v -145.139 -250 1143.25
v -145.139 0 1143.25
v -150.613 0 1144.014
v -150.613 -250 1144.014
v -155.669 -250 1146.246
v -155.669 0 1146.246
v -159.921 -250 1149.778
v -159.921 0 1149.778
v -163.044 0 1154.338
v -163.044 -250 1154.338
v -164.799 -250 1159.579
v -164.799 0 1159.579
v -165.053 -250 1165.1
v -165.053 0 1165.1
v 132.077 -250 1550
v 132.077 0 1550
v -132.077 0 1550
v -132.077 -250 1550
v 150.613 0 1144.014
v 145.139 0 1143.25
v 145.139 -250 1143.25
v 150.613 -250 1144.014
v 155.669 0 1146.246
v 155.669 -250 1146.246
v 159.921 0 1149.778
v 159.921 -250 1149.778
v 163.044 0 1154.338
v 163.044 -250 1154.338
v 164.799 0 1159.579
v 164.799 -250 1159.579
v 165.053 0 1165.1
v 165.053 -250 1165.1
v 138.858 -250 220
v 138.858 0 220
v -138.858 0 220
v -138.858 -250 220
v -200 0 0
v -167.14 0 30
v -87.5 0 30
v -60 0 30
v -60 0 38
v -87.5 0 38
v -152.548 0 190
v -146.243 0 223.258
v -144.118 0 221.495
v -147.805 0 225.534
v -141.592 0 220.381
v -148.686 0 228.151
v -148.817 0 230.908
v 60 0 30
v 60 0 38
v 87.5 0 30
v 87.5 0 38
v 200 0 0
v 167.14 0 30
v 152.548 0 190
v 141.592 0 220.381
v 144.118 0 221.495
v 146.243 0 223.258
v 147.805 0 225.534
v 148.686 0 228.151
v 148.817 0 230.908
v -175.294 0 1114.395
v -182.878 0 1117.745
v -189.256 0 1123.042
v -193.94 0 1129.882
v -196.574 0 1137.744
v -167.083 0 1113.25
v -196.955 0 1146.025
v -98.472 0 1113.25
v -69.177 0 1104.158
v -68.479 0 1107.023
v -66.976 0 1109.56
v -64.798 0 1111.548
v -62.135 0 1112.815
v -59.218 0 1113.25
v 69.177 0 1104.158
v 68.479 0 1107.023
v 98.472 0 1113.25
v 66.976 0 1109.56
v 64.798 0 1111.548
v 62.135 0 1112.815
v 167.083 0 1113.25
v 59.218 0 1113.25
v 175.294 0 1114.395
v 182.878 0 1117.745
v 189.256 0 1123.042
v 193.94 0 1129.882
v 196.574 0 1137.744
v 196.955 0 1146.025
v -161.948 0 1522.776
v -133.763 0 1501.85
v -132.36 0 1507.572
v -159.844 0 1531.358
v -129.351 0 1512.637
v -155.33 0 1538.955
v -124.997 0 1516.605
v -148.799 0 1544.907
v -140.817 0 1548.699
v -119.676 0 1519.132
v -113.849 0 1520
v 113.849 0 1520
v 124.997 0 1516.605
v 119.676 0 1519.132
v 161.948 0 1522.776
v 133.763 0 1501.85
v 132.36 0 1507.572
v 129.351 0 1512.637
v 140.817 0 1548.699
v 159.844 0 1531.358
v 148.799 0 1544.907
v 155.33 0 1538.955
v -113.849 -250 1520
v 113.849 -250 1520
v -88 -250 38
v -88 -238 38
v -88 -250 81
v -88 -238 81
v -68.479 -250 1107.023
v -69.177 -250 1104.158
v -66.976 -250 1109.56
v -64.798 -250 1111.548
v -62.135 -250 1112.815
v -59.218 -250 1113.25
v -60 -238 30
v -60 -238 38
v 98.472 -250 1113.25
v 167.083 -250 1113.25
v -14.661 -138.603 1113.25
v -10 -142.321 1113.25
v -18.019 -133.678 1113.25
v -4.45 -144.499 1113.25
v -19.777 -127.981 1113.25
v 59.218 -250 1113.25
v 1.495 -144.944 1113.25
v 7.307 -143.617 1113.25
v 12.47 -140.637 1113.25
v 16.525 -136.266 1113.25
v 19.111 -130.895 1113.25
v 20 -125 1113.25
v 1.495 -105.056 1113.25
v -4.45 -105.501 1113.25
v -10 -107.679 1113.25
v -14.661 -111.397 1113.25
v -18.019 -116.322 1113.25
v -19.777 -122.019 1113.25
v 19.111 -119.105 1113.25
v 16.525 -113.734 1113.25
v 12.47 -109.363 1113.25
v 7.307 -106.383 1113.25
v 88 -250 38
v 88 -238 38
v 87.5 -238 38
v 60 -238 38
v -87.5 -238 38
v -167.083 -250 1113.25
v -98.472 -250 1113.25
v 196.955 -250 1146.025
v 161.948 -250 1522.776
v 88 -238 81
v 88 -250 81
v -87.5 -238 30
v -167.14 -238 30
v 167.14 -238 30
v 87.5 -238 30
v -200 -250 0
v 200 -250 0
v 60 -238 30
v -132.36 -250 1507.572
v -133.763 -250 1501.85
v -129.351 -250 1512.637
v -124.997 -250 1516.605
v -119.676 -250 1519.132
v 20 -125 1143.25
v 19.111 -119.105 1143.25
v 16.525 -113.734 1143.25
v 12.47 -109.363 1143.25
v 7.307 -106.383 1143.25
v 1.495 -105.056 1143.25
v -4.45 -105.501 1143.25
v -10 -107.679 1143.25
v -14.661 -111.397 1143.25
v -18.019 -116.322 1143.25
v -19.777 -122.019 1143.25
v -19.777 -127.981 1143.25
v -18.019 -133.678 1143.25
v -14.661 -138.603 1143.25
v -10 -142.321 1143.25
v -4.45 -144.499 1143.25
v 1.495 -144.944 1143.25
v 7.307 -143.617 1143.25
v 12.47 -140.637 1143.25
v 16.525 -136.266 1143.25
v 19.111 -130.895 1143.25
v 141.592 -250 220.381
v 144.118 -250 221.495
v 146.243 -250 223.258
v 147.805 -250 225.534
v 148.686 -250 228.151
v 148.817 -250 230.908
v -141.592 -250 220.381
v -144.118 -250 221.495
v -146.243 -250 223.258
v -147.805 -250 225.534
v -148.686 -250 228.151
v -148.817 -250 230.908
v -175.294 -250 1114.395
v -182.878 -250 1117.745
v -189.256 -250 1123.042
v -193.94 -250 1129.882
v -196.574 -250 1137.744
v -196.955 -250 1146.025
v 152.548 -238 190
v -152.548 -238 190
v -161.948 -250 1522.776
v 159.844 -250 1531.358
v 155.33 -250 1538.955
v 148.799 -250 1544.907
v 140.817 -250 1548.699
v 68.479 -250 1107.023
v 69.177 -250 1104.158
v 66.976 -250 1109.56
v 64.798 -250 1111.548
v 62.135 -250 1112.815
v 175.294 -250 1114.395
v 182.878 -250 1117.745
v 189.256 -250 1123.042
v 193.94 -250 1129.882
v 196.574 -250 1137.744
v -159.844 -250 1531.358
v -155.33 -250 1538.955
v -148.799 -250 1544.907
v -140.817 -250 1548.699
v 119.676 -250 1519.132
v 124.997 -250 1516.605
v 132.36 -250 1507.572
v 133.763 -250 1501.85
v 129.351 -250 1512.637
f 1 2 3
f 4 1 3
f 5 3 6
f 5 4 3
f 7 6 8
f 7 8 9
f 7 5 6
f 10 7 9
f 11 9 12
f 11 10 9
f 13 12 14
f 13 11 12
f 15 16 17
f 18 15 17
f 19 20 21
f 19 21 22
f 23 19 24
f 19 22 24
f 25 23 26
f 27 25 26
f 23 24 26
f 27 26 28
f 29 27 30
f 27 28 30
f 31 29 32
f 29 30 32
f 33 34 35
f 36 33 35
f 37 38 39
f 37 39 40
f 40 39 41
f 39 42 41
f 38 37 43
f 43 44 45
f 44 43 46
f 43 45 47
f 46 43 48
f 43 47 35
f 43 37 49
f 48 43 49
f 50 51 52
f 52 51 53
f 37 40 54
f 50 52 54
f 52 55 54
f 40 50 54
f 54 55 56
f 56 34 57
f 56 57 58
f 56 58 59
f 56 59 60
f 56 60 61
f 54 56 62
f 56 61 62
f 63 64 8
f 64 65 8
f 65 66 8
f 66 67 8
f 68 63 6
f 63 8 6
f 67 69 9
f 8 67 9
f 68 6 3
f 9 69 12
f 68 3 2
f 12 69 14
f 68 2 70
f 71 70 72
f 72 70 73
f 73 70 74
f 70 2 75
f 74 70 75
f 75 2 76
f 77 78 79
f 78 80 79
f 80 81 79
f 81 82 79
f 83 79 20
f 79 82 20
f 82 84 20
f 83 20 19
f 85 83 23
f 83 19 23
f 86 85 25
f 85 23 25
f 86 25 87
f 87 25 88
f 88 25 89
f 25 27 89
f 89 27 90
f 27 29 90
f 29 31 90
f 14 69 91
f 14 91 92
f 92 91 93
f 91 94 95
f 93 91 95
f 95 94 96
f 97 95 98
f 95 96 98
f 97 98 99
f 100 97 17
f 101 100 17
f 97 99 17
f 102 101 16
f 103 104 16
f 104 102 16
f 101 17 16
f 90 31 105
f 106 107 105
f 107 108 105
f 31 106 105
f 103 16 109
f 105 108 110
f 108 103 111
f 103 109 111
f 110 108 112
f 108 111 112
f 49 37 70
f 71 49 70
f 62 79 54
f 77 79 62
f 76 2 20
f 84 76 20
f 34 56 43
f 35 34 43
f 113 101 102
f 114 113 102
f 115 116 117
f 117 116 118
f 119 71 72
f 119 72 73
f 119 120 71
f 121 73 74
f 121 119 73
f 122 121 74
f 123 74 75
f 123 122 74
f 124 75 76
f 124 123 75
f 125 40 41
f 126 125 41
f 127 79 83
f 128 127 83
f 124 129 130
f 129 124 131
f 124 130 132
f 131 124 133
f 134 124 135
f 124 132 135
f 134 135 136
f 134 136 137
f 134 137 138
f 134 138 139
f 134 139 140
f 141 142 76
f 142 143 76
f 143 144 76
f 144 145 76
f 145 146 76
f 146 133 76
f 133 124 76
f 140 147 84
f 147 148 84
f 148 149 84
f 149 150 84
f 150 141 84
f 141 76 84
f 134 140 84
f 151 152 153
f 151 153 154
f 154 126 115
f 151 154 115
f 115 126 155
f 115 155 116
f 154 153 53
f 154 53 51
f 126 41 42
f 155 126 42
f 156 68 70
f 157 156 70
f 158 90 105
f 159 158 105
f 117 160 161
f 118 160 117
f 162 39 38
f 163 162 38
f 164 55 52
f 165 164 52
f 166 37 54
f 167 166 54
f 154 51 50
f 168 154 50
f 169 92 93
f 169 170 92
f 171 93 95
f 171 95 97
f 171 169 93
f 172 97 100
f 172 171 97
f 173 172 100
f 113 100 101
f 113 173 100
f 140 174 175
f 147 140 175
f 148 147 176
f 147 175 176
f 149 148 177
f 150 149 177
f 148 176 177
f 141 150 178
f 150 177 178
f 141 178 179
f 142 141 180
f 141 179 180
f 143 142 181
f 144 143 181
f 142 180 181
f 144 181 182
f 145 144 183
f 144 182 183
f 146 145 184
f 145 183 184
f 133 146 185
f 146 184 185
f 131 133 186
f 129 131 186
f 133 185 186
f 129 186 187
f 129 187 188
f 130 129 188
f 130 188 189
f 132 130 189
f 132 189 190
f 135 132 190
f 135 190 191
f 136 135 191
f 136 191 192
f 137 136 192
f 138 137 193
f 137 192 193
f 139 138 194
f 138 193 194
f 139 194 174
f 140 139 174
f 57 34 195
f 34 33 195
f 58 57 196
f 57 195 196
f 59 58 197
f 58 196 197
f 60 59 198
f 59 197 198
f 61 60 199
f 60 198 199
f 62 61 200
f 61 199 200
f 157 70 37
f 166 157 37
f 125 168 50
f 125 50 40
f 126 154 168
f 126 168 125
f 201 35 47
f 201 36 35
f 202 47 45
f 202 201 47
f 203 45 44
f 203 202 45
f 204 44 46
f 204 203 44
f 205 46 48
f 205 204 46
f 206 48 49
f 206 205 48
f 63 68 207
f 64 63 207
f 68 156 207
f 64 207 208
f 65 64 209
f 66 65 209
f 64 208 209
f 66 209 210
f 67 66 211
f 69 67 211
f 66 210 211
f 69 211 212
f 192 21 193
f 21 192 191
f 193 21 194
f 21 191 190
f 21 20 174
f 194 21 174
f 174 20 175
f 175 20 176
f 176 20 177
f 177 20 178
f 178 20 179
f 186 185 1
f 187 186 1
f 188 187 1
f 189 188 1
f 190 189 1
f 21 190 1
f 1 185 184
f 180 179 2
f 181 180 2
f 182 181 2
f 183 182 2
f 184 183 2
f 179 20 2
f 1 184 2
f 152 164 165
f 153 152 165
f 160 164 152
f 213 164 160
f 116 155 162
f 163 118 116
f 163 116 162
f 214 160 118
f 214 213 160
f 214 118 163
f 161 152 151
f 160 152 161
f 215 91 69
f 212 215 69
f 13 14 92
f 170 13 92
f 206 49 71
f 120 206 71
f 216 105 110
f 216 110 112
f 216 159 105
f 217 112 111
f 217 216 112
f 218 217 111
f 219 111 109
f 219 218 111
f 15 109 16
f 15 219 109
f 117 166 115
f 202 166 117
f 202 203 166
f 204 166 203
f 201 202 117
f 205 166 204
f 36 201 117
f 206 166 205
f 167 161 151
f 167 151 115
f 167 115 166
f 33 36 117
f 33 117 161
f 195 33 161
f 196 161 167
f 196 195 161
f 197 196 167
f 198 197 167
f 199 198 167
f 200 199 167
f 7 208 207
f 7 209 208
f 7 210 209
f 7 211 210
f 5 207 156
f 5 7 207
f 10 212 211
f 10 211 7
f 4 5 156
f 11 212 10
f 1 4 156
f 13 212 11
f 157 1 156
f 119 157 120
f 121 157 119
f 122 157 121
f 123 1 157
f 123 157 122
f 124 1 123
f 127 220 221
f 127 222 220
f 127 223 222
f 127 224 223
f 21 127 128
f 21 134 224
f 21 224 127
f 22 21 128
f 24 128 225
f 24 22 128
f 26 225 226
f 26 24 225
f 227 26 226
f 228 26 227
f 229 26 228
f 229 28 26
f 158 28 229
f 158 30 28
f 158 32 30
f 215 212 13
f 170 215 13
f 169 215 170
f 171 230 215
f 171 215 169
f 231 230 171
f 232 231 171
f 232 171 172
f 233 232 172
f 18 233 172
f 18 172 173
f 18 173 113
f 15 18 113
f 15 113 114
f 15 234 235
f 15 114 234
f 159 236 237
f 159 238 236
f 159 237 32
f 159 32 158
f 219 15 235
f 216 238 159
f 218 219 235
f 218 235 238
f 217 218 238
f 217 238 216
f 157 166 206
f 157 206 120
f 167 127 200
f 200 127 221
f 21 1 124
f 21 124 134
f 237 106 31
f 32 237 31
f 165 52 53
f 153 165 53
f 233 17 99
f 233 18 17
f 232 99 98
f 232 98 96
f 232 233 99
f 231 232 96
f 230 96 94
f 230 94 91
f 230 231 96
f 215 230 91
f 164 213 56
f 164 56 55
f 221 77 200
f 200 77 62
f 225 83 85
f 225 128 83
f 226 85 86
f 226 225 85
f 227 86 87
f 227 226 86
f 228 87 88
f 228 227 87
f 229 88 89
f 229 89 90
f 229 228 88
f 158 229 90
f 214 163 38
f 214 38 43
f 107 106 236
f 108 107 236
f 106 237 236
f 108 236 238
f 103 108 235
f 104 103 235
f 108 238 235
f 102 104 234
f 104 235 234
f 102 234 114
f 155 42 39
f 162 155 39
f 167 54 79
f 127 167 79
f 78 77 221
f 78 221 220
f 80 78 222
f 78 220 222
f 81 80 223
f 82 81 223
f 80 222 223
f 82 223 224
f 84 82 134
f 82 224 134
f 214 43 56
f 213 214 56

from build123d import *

# Parameters (mm, degrees)
F1_DEPTH  = 250
F3_DEPTH  = 238
F4_W      = 176
F4_H      = 43
F5_DEPTH  = 12.001
F6_R      = 10
F7_R      = 30
F8_R      = 20
F9_R      = 20
F10_DEPTH = 30


with BuildPart() as f1:
    # F0 (on Front) → F1 (new body)
    with BuildSketch(Plane.XZ):
        Polygon((200, 0), (98.472164, 1113.249898), (200, 1113.249898), (159.418754, 1550), (-159.418754, 1550), (-200, 1113.249898), (-98.472164, 1113.249898), (-200, 0), align=None)
        Polygon((-149.811608, 220), (-68.347662, 1113.249898), (68.347662, 1113.249898), (149.811608, 220), align=None, mode=Mode.SUBTRACT)
        Polygon((-167.083285, 1143.249898), (-132.077022, 1520), (132.077022, 1520), (167.083285, 1143.249898), align=None, mode=Mode.SUBTRACT)
    extrude(amount=F1_DEPTH)

    # F2 (on face) → F3 (cut)
    with BuildSketch(Plane(origin=(0, 0, 0), x_dir=(-1, 0, 0), z_dir=(0, 1, 0))):
        Polygon((152.547593, 190), (-152.547593, 190), (-167.139513, 30), (-87.5, 30), (-87.5, 38), (-60, 38), (-60, 30), (60, 30), (60, 38), (87.5, 38), (87.5, 30), (167.139513, 30), align=None)
    extrude(amount=-F3_DEPTH, mode=Mode.SUBTRACT)

    # F4 (on face) → F5 (cut, through all)
    with BuildSketch(Plane(origin=(0, -238, 0), x_dir=(-1, 0, 0), z_dir=(0, 1, 0))):
        with Locations((0, 59.5)):
            Rectangle(F4_W, F4_H)
    extrude(amount=-F5_DEPTH, mode=Mode.SUBTRACT)

    # F6
    f6_edges = [f1.edges().sort_by_distance(p)[0] for p in [
        (-149.811608, -125, 220),
        (149.811608, -125, 220),
        (-68.347662, -125, 1113.249898),
        (68.347662, -125, 1113.249898),
    ]]
    fillet(f6_edges, radius=F6_R)

    # F7
    f7_edges = [f1.edges().sort_by_distance(p)[0] for p in [
        (200, -125, 1113.249898),
        (-200, -125, 1113.249898),
        (-159.418754, -125, 1550),
        (159.418754, -125, 1550),
    ]]
    fillet(f7_edges, radius=F7_R)

    # F8
    f8_edges = [f1.edges().sort_by_distance(p)[0] for p in [
        (-167.083285, -125, 1143.249898),
        (-132.077022, -125, 1520),
        (132.077022, -125, 1520),
        (167.083285, -125, 1143.249898),
    ]]
    fillet(f8_edges, radius=F8_R)

    # F9 (on face) → F10 (cut, through all)
    with BuildSketch(Plane.XY.offset(1143.249898)):
        with Locations((0, -125)):
            Circle(F9_R)
    extrude(amount=-F10_DEPTH, mode=Mode.SUBTRACT)


solid = f1.part
